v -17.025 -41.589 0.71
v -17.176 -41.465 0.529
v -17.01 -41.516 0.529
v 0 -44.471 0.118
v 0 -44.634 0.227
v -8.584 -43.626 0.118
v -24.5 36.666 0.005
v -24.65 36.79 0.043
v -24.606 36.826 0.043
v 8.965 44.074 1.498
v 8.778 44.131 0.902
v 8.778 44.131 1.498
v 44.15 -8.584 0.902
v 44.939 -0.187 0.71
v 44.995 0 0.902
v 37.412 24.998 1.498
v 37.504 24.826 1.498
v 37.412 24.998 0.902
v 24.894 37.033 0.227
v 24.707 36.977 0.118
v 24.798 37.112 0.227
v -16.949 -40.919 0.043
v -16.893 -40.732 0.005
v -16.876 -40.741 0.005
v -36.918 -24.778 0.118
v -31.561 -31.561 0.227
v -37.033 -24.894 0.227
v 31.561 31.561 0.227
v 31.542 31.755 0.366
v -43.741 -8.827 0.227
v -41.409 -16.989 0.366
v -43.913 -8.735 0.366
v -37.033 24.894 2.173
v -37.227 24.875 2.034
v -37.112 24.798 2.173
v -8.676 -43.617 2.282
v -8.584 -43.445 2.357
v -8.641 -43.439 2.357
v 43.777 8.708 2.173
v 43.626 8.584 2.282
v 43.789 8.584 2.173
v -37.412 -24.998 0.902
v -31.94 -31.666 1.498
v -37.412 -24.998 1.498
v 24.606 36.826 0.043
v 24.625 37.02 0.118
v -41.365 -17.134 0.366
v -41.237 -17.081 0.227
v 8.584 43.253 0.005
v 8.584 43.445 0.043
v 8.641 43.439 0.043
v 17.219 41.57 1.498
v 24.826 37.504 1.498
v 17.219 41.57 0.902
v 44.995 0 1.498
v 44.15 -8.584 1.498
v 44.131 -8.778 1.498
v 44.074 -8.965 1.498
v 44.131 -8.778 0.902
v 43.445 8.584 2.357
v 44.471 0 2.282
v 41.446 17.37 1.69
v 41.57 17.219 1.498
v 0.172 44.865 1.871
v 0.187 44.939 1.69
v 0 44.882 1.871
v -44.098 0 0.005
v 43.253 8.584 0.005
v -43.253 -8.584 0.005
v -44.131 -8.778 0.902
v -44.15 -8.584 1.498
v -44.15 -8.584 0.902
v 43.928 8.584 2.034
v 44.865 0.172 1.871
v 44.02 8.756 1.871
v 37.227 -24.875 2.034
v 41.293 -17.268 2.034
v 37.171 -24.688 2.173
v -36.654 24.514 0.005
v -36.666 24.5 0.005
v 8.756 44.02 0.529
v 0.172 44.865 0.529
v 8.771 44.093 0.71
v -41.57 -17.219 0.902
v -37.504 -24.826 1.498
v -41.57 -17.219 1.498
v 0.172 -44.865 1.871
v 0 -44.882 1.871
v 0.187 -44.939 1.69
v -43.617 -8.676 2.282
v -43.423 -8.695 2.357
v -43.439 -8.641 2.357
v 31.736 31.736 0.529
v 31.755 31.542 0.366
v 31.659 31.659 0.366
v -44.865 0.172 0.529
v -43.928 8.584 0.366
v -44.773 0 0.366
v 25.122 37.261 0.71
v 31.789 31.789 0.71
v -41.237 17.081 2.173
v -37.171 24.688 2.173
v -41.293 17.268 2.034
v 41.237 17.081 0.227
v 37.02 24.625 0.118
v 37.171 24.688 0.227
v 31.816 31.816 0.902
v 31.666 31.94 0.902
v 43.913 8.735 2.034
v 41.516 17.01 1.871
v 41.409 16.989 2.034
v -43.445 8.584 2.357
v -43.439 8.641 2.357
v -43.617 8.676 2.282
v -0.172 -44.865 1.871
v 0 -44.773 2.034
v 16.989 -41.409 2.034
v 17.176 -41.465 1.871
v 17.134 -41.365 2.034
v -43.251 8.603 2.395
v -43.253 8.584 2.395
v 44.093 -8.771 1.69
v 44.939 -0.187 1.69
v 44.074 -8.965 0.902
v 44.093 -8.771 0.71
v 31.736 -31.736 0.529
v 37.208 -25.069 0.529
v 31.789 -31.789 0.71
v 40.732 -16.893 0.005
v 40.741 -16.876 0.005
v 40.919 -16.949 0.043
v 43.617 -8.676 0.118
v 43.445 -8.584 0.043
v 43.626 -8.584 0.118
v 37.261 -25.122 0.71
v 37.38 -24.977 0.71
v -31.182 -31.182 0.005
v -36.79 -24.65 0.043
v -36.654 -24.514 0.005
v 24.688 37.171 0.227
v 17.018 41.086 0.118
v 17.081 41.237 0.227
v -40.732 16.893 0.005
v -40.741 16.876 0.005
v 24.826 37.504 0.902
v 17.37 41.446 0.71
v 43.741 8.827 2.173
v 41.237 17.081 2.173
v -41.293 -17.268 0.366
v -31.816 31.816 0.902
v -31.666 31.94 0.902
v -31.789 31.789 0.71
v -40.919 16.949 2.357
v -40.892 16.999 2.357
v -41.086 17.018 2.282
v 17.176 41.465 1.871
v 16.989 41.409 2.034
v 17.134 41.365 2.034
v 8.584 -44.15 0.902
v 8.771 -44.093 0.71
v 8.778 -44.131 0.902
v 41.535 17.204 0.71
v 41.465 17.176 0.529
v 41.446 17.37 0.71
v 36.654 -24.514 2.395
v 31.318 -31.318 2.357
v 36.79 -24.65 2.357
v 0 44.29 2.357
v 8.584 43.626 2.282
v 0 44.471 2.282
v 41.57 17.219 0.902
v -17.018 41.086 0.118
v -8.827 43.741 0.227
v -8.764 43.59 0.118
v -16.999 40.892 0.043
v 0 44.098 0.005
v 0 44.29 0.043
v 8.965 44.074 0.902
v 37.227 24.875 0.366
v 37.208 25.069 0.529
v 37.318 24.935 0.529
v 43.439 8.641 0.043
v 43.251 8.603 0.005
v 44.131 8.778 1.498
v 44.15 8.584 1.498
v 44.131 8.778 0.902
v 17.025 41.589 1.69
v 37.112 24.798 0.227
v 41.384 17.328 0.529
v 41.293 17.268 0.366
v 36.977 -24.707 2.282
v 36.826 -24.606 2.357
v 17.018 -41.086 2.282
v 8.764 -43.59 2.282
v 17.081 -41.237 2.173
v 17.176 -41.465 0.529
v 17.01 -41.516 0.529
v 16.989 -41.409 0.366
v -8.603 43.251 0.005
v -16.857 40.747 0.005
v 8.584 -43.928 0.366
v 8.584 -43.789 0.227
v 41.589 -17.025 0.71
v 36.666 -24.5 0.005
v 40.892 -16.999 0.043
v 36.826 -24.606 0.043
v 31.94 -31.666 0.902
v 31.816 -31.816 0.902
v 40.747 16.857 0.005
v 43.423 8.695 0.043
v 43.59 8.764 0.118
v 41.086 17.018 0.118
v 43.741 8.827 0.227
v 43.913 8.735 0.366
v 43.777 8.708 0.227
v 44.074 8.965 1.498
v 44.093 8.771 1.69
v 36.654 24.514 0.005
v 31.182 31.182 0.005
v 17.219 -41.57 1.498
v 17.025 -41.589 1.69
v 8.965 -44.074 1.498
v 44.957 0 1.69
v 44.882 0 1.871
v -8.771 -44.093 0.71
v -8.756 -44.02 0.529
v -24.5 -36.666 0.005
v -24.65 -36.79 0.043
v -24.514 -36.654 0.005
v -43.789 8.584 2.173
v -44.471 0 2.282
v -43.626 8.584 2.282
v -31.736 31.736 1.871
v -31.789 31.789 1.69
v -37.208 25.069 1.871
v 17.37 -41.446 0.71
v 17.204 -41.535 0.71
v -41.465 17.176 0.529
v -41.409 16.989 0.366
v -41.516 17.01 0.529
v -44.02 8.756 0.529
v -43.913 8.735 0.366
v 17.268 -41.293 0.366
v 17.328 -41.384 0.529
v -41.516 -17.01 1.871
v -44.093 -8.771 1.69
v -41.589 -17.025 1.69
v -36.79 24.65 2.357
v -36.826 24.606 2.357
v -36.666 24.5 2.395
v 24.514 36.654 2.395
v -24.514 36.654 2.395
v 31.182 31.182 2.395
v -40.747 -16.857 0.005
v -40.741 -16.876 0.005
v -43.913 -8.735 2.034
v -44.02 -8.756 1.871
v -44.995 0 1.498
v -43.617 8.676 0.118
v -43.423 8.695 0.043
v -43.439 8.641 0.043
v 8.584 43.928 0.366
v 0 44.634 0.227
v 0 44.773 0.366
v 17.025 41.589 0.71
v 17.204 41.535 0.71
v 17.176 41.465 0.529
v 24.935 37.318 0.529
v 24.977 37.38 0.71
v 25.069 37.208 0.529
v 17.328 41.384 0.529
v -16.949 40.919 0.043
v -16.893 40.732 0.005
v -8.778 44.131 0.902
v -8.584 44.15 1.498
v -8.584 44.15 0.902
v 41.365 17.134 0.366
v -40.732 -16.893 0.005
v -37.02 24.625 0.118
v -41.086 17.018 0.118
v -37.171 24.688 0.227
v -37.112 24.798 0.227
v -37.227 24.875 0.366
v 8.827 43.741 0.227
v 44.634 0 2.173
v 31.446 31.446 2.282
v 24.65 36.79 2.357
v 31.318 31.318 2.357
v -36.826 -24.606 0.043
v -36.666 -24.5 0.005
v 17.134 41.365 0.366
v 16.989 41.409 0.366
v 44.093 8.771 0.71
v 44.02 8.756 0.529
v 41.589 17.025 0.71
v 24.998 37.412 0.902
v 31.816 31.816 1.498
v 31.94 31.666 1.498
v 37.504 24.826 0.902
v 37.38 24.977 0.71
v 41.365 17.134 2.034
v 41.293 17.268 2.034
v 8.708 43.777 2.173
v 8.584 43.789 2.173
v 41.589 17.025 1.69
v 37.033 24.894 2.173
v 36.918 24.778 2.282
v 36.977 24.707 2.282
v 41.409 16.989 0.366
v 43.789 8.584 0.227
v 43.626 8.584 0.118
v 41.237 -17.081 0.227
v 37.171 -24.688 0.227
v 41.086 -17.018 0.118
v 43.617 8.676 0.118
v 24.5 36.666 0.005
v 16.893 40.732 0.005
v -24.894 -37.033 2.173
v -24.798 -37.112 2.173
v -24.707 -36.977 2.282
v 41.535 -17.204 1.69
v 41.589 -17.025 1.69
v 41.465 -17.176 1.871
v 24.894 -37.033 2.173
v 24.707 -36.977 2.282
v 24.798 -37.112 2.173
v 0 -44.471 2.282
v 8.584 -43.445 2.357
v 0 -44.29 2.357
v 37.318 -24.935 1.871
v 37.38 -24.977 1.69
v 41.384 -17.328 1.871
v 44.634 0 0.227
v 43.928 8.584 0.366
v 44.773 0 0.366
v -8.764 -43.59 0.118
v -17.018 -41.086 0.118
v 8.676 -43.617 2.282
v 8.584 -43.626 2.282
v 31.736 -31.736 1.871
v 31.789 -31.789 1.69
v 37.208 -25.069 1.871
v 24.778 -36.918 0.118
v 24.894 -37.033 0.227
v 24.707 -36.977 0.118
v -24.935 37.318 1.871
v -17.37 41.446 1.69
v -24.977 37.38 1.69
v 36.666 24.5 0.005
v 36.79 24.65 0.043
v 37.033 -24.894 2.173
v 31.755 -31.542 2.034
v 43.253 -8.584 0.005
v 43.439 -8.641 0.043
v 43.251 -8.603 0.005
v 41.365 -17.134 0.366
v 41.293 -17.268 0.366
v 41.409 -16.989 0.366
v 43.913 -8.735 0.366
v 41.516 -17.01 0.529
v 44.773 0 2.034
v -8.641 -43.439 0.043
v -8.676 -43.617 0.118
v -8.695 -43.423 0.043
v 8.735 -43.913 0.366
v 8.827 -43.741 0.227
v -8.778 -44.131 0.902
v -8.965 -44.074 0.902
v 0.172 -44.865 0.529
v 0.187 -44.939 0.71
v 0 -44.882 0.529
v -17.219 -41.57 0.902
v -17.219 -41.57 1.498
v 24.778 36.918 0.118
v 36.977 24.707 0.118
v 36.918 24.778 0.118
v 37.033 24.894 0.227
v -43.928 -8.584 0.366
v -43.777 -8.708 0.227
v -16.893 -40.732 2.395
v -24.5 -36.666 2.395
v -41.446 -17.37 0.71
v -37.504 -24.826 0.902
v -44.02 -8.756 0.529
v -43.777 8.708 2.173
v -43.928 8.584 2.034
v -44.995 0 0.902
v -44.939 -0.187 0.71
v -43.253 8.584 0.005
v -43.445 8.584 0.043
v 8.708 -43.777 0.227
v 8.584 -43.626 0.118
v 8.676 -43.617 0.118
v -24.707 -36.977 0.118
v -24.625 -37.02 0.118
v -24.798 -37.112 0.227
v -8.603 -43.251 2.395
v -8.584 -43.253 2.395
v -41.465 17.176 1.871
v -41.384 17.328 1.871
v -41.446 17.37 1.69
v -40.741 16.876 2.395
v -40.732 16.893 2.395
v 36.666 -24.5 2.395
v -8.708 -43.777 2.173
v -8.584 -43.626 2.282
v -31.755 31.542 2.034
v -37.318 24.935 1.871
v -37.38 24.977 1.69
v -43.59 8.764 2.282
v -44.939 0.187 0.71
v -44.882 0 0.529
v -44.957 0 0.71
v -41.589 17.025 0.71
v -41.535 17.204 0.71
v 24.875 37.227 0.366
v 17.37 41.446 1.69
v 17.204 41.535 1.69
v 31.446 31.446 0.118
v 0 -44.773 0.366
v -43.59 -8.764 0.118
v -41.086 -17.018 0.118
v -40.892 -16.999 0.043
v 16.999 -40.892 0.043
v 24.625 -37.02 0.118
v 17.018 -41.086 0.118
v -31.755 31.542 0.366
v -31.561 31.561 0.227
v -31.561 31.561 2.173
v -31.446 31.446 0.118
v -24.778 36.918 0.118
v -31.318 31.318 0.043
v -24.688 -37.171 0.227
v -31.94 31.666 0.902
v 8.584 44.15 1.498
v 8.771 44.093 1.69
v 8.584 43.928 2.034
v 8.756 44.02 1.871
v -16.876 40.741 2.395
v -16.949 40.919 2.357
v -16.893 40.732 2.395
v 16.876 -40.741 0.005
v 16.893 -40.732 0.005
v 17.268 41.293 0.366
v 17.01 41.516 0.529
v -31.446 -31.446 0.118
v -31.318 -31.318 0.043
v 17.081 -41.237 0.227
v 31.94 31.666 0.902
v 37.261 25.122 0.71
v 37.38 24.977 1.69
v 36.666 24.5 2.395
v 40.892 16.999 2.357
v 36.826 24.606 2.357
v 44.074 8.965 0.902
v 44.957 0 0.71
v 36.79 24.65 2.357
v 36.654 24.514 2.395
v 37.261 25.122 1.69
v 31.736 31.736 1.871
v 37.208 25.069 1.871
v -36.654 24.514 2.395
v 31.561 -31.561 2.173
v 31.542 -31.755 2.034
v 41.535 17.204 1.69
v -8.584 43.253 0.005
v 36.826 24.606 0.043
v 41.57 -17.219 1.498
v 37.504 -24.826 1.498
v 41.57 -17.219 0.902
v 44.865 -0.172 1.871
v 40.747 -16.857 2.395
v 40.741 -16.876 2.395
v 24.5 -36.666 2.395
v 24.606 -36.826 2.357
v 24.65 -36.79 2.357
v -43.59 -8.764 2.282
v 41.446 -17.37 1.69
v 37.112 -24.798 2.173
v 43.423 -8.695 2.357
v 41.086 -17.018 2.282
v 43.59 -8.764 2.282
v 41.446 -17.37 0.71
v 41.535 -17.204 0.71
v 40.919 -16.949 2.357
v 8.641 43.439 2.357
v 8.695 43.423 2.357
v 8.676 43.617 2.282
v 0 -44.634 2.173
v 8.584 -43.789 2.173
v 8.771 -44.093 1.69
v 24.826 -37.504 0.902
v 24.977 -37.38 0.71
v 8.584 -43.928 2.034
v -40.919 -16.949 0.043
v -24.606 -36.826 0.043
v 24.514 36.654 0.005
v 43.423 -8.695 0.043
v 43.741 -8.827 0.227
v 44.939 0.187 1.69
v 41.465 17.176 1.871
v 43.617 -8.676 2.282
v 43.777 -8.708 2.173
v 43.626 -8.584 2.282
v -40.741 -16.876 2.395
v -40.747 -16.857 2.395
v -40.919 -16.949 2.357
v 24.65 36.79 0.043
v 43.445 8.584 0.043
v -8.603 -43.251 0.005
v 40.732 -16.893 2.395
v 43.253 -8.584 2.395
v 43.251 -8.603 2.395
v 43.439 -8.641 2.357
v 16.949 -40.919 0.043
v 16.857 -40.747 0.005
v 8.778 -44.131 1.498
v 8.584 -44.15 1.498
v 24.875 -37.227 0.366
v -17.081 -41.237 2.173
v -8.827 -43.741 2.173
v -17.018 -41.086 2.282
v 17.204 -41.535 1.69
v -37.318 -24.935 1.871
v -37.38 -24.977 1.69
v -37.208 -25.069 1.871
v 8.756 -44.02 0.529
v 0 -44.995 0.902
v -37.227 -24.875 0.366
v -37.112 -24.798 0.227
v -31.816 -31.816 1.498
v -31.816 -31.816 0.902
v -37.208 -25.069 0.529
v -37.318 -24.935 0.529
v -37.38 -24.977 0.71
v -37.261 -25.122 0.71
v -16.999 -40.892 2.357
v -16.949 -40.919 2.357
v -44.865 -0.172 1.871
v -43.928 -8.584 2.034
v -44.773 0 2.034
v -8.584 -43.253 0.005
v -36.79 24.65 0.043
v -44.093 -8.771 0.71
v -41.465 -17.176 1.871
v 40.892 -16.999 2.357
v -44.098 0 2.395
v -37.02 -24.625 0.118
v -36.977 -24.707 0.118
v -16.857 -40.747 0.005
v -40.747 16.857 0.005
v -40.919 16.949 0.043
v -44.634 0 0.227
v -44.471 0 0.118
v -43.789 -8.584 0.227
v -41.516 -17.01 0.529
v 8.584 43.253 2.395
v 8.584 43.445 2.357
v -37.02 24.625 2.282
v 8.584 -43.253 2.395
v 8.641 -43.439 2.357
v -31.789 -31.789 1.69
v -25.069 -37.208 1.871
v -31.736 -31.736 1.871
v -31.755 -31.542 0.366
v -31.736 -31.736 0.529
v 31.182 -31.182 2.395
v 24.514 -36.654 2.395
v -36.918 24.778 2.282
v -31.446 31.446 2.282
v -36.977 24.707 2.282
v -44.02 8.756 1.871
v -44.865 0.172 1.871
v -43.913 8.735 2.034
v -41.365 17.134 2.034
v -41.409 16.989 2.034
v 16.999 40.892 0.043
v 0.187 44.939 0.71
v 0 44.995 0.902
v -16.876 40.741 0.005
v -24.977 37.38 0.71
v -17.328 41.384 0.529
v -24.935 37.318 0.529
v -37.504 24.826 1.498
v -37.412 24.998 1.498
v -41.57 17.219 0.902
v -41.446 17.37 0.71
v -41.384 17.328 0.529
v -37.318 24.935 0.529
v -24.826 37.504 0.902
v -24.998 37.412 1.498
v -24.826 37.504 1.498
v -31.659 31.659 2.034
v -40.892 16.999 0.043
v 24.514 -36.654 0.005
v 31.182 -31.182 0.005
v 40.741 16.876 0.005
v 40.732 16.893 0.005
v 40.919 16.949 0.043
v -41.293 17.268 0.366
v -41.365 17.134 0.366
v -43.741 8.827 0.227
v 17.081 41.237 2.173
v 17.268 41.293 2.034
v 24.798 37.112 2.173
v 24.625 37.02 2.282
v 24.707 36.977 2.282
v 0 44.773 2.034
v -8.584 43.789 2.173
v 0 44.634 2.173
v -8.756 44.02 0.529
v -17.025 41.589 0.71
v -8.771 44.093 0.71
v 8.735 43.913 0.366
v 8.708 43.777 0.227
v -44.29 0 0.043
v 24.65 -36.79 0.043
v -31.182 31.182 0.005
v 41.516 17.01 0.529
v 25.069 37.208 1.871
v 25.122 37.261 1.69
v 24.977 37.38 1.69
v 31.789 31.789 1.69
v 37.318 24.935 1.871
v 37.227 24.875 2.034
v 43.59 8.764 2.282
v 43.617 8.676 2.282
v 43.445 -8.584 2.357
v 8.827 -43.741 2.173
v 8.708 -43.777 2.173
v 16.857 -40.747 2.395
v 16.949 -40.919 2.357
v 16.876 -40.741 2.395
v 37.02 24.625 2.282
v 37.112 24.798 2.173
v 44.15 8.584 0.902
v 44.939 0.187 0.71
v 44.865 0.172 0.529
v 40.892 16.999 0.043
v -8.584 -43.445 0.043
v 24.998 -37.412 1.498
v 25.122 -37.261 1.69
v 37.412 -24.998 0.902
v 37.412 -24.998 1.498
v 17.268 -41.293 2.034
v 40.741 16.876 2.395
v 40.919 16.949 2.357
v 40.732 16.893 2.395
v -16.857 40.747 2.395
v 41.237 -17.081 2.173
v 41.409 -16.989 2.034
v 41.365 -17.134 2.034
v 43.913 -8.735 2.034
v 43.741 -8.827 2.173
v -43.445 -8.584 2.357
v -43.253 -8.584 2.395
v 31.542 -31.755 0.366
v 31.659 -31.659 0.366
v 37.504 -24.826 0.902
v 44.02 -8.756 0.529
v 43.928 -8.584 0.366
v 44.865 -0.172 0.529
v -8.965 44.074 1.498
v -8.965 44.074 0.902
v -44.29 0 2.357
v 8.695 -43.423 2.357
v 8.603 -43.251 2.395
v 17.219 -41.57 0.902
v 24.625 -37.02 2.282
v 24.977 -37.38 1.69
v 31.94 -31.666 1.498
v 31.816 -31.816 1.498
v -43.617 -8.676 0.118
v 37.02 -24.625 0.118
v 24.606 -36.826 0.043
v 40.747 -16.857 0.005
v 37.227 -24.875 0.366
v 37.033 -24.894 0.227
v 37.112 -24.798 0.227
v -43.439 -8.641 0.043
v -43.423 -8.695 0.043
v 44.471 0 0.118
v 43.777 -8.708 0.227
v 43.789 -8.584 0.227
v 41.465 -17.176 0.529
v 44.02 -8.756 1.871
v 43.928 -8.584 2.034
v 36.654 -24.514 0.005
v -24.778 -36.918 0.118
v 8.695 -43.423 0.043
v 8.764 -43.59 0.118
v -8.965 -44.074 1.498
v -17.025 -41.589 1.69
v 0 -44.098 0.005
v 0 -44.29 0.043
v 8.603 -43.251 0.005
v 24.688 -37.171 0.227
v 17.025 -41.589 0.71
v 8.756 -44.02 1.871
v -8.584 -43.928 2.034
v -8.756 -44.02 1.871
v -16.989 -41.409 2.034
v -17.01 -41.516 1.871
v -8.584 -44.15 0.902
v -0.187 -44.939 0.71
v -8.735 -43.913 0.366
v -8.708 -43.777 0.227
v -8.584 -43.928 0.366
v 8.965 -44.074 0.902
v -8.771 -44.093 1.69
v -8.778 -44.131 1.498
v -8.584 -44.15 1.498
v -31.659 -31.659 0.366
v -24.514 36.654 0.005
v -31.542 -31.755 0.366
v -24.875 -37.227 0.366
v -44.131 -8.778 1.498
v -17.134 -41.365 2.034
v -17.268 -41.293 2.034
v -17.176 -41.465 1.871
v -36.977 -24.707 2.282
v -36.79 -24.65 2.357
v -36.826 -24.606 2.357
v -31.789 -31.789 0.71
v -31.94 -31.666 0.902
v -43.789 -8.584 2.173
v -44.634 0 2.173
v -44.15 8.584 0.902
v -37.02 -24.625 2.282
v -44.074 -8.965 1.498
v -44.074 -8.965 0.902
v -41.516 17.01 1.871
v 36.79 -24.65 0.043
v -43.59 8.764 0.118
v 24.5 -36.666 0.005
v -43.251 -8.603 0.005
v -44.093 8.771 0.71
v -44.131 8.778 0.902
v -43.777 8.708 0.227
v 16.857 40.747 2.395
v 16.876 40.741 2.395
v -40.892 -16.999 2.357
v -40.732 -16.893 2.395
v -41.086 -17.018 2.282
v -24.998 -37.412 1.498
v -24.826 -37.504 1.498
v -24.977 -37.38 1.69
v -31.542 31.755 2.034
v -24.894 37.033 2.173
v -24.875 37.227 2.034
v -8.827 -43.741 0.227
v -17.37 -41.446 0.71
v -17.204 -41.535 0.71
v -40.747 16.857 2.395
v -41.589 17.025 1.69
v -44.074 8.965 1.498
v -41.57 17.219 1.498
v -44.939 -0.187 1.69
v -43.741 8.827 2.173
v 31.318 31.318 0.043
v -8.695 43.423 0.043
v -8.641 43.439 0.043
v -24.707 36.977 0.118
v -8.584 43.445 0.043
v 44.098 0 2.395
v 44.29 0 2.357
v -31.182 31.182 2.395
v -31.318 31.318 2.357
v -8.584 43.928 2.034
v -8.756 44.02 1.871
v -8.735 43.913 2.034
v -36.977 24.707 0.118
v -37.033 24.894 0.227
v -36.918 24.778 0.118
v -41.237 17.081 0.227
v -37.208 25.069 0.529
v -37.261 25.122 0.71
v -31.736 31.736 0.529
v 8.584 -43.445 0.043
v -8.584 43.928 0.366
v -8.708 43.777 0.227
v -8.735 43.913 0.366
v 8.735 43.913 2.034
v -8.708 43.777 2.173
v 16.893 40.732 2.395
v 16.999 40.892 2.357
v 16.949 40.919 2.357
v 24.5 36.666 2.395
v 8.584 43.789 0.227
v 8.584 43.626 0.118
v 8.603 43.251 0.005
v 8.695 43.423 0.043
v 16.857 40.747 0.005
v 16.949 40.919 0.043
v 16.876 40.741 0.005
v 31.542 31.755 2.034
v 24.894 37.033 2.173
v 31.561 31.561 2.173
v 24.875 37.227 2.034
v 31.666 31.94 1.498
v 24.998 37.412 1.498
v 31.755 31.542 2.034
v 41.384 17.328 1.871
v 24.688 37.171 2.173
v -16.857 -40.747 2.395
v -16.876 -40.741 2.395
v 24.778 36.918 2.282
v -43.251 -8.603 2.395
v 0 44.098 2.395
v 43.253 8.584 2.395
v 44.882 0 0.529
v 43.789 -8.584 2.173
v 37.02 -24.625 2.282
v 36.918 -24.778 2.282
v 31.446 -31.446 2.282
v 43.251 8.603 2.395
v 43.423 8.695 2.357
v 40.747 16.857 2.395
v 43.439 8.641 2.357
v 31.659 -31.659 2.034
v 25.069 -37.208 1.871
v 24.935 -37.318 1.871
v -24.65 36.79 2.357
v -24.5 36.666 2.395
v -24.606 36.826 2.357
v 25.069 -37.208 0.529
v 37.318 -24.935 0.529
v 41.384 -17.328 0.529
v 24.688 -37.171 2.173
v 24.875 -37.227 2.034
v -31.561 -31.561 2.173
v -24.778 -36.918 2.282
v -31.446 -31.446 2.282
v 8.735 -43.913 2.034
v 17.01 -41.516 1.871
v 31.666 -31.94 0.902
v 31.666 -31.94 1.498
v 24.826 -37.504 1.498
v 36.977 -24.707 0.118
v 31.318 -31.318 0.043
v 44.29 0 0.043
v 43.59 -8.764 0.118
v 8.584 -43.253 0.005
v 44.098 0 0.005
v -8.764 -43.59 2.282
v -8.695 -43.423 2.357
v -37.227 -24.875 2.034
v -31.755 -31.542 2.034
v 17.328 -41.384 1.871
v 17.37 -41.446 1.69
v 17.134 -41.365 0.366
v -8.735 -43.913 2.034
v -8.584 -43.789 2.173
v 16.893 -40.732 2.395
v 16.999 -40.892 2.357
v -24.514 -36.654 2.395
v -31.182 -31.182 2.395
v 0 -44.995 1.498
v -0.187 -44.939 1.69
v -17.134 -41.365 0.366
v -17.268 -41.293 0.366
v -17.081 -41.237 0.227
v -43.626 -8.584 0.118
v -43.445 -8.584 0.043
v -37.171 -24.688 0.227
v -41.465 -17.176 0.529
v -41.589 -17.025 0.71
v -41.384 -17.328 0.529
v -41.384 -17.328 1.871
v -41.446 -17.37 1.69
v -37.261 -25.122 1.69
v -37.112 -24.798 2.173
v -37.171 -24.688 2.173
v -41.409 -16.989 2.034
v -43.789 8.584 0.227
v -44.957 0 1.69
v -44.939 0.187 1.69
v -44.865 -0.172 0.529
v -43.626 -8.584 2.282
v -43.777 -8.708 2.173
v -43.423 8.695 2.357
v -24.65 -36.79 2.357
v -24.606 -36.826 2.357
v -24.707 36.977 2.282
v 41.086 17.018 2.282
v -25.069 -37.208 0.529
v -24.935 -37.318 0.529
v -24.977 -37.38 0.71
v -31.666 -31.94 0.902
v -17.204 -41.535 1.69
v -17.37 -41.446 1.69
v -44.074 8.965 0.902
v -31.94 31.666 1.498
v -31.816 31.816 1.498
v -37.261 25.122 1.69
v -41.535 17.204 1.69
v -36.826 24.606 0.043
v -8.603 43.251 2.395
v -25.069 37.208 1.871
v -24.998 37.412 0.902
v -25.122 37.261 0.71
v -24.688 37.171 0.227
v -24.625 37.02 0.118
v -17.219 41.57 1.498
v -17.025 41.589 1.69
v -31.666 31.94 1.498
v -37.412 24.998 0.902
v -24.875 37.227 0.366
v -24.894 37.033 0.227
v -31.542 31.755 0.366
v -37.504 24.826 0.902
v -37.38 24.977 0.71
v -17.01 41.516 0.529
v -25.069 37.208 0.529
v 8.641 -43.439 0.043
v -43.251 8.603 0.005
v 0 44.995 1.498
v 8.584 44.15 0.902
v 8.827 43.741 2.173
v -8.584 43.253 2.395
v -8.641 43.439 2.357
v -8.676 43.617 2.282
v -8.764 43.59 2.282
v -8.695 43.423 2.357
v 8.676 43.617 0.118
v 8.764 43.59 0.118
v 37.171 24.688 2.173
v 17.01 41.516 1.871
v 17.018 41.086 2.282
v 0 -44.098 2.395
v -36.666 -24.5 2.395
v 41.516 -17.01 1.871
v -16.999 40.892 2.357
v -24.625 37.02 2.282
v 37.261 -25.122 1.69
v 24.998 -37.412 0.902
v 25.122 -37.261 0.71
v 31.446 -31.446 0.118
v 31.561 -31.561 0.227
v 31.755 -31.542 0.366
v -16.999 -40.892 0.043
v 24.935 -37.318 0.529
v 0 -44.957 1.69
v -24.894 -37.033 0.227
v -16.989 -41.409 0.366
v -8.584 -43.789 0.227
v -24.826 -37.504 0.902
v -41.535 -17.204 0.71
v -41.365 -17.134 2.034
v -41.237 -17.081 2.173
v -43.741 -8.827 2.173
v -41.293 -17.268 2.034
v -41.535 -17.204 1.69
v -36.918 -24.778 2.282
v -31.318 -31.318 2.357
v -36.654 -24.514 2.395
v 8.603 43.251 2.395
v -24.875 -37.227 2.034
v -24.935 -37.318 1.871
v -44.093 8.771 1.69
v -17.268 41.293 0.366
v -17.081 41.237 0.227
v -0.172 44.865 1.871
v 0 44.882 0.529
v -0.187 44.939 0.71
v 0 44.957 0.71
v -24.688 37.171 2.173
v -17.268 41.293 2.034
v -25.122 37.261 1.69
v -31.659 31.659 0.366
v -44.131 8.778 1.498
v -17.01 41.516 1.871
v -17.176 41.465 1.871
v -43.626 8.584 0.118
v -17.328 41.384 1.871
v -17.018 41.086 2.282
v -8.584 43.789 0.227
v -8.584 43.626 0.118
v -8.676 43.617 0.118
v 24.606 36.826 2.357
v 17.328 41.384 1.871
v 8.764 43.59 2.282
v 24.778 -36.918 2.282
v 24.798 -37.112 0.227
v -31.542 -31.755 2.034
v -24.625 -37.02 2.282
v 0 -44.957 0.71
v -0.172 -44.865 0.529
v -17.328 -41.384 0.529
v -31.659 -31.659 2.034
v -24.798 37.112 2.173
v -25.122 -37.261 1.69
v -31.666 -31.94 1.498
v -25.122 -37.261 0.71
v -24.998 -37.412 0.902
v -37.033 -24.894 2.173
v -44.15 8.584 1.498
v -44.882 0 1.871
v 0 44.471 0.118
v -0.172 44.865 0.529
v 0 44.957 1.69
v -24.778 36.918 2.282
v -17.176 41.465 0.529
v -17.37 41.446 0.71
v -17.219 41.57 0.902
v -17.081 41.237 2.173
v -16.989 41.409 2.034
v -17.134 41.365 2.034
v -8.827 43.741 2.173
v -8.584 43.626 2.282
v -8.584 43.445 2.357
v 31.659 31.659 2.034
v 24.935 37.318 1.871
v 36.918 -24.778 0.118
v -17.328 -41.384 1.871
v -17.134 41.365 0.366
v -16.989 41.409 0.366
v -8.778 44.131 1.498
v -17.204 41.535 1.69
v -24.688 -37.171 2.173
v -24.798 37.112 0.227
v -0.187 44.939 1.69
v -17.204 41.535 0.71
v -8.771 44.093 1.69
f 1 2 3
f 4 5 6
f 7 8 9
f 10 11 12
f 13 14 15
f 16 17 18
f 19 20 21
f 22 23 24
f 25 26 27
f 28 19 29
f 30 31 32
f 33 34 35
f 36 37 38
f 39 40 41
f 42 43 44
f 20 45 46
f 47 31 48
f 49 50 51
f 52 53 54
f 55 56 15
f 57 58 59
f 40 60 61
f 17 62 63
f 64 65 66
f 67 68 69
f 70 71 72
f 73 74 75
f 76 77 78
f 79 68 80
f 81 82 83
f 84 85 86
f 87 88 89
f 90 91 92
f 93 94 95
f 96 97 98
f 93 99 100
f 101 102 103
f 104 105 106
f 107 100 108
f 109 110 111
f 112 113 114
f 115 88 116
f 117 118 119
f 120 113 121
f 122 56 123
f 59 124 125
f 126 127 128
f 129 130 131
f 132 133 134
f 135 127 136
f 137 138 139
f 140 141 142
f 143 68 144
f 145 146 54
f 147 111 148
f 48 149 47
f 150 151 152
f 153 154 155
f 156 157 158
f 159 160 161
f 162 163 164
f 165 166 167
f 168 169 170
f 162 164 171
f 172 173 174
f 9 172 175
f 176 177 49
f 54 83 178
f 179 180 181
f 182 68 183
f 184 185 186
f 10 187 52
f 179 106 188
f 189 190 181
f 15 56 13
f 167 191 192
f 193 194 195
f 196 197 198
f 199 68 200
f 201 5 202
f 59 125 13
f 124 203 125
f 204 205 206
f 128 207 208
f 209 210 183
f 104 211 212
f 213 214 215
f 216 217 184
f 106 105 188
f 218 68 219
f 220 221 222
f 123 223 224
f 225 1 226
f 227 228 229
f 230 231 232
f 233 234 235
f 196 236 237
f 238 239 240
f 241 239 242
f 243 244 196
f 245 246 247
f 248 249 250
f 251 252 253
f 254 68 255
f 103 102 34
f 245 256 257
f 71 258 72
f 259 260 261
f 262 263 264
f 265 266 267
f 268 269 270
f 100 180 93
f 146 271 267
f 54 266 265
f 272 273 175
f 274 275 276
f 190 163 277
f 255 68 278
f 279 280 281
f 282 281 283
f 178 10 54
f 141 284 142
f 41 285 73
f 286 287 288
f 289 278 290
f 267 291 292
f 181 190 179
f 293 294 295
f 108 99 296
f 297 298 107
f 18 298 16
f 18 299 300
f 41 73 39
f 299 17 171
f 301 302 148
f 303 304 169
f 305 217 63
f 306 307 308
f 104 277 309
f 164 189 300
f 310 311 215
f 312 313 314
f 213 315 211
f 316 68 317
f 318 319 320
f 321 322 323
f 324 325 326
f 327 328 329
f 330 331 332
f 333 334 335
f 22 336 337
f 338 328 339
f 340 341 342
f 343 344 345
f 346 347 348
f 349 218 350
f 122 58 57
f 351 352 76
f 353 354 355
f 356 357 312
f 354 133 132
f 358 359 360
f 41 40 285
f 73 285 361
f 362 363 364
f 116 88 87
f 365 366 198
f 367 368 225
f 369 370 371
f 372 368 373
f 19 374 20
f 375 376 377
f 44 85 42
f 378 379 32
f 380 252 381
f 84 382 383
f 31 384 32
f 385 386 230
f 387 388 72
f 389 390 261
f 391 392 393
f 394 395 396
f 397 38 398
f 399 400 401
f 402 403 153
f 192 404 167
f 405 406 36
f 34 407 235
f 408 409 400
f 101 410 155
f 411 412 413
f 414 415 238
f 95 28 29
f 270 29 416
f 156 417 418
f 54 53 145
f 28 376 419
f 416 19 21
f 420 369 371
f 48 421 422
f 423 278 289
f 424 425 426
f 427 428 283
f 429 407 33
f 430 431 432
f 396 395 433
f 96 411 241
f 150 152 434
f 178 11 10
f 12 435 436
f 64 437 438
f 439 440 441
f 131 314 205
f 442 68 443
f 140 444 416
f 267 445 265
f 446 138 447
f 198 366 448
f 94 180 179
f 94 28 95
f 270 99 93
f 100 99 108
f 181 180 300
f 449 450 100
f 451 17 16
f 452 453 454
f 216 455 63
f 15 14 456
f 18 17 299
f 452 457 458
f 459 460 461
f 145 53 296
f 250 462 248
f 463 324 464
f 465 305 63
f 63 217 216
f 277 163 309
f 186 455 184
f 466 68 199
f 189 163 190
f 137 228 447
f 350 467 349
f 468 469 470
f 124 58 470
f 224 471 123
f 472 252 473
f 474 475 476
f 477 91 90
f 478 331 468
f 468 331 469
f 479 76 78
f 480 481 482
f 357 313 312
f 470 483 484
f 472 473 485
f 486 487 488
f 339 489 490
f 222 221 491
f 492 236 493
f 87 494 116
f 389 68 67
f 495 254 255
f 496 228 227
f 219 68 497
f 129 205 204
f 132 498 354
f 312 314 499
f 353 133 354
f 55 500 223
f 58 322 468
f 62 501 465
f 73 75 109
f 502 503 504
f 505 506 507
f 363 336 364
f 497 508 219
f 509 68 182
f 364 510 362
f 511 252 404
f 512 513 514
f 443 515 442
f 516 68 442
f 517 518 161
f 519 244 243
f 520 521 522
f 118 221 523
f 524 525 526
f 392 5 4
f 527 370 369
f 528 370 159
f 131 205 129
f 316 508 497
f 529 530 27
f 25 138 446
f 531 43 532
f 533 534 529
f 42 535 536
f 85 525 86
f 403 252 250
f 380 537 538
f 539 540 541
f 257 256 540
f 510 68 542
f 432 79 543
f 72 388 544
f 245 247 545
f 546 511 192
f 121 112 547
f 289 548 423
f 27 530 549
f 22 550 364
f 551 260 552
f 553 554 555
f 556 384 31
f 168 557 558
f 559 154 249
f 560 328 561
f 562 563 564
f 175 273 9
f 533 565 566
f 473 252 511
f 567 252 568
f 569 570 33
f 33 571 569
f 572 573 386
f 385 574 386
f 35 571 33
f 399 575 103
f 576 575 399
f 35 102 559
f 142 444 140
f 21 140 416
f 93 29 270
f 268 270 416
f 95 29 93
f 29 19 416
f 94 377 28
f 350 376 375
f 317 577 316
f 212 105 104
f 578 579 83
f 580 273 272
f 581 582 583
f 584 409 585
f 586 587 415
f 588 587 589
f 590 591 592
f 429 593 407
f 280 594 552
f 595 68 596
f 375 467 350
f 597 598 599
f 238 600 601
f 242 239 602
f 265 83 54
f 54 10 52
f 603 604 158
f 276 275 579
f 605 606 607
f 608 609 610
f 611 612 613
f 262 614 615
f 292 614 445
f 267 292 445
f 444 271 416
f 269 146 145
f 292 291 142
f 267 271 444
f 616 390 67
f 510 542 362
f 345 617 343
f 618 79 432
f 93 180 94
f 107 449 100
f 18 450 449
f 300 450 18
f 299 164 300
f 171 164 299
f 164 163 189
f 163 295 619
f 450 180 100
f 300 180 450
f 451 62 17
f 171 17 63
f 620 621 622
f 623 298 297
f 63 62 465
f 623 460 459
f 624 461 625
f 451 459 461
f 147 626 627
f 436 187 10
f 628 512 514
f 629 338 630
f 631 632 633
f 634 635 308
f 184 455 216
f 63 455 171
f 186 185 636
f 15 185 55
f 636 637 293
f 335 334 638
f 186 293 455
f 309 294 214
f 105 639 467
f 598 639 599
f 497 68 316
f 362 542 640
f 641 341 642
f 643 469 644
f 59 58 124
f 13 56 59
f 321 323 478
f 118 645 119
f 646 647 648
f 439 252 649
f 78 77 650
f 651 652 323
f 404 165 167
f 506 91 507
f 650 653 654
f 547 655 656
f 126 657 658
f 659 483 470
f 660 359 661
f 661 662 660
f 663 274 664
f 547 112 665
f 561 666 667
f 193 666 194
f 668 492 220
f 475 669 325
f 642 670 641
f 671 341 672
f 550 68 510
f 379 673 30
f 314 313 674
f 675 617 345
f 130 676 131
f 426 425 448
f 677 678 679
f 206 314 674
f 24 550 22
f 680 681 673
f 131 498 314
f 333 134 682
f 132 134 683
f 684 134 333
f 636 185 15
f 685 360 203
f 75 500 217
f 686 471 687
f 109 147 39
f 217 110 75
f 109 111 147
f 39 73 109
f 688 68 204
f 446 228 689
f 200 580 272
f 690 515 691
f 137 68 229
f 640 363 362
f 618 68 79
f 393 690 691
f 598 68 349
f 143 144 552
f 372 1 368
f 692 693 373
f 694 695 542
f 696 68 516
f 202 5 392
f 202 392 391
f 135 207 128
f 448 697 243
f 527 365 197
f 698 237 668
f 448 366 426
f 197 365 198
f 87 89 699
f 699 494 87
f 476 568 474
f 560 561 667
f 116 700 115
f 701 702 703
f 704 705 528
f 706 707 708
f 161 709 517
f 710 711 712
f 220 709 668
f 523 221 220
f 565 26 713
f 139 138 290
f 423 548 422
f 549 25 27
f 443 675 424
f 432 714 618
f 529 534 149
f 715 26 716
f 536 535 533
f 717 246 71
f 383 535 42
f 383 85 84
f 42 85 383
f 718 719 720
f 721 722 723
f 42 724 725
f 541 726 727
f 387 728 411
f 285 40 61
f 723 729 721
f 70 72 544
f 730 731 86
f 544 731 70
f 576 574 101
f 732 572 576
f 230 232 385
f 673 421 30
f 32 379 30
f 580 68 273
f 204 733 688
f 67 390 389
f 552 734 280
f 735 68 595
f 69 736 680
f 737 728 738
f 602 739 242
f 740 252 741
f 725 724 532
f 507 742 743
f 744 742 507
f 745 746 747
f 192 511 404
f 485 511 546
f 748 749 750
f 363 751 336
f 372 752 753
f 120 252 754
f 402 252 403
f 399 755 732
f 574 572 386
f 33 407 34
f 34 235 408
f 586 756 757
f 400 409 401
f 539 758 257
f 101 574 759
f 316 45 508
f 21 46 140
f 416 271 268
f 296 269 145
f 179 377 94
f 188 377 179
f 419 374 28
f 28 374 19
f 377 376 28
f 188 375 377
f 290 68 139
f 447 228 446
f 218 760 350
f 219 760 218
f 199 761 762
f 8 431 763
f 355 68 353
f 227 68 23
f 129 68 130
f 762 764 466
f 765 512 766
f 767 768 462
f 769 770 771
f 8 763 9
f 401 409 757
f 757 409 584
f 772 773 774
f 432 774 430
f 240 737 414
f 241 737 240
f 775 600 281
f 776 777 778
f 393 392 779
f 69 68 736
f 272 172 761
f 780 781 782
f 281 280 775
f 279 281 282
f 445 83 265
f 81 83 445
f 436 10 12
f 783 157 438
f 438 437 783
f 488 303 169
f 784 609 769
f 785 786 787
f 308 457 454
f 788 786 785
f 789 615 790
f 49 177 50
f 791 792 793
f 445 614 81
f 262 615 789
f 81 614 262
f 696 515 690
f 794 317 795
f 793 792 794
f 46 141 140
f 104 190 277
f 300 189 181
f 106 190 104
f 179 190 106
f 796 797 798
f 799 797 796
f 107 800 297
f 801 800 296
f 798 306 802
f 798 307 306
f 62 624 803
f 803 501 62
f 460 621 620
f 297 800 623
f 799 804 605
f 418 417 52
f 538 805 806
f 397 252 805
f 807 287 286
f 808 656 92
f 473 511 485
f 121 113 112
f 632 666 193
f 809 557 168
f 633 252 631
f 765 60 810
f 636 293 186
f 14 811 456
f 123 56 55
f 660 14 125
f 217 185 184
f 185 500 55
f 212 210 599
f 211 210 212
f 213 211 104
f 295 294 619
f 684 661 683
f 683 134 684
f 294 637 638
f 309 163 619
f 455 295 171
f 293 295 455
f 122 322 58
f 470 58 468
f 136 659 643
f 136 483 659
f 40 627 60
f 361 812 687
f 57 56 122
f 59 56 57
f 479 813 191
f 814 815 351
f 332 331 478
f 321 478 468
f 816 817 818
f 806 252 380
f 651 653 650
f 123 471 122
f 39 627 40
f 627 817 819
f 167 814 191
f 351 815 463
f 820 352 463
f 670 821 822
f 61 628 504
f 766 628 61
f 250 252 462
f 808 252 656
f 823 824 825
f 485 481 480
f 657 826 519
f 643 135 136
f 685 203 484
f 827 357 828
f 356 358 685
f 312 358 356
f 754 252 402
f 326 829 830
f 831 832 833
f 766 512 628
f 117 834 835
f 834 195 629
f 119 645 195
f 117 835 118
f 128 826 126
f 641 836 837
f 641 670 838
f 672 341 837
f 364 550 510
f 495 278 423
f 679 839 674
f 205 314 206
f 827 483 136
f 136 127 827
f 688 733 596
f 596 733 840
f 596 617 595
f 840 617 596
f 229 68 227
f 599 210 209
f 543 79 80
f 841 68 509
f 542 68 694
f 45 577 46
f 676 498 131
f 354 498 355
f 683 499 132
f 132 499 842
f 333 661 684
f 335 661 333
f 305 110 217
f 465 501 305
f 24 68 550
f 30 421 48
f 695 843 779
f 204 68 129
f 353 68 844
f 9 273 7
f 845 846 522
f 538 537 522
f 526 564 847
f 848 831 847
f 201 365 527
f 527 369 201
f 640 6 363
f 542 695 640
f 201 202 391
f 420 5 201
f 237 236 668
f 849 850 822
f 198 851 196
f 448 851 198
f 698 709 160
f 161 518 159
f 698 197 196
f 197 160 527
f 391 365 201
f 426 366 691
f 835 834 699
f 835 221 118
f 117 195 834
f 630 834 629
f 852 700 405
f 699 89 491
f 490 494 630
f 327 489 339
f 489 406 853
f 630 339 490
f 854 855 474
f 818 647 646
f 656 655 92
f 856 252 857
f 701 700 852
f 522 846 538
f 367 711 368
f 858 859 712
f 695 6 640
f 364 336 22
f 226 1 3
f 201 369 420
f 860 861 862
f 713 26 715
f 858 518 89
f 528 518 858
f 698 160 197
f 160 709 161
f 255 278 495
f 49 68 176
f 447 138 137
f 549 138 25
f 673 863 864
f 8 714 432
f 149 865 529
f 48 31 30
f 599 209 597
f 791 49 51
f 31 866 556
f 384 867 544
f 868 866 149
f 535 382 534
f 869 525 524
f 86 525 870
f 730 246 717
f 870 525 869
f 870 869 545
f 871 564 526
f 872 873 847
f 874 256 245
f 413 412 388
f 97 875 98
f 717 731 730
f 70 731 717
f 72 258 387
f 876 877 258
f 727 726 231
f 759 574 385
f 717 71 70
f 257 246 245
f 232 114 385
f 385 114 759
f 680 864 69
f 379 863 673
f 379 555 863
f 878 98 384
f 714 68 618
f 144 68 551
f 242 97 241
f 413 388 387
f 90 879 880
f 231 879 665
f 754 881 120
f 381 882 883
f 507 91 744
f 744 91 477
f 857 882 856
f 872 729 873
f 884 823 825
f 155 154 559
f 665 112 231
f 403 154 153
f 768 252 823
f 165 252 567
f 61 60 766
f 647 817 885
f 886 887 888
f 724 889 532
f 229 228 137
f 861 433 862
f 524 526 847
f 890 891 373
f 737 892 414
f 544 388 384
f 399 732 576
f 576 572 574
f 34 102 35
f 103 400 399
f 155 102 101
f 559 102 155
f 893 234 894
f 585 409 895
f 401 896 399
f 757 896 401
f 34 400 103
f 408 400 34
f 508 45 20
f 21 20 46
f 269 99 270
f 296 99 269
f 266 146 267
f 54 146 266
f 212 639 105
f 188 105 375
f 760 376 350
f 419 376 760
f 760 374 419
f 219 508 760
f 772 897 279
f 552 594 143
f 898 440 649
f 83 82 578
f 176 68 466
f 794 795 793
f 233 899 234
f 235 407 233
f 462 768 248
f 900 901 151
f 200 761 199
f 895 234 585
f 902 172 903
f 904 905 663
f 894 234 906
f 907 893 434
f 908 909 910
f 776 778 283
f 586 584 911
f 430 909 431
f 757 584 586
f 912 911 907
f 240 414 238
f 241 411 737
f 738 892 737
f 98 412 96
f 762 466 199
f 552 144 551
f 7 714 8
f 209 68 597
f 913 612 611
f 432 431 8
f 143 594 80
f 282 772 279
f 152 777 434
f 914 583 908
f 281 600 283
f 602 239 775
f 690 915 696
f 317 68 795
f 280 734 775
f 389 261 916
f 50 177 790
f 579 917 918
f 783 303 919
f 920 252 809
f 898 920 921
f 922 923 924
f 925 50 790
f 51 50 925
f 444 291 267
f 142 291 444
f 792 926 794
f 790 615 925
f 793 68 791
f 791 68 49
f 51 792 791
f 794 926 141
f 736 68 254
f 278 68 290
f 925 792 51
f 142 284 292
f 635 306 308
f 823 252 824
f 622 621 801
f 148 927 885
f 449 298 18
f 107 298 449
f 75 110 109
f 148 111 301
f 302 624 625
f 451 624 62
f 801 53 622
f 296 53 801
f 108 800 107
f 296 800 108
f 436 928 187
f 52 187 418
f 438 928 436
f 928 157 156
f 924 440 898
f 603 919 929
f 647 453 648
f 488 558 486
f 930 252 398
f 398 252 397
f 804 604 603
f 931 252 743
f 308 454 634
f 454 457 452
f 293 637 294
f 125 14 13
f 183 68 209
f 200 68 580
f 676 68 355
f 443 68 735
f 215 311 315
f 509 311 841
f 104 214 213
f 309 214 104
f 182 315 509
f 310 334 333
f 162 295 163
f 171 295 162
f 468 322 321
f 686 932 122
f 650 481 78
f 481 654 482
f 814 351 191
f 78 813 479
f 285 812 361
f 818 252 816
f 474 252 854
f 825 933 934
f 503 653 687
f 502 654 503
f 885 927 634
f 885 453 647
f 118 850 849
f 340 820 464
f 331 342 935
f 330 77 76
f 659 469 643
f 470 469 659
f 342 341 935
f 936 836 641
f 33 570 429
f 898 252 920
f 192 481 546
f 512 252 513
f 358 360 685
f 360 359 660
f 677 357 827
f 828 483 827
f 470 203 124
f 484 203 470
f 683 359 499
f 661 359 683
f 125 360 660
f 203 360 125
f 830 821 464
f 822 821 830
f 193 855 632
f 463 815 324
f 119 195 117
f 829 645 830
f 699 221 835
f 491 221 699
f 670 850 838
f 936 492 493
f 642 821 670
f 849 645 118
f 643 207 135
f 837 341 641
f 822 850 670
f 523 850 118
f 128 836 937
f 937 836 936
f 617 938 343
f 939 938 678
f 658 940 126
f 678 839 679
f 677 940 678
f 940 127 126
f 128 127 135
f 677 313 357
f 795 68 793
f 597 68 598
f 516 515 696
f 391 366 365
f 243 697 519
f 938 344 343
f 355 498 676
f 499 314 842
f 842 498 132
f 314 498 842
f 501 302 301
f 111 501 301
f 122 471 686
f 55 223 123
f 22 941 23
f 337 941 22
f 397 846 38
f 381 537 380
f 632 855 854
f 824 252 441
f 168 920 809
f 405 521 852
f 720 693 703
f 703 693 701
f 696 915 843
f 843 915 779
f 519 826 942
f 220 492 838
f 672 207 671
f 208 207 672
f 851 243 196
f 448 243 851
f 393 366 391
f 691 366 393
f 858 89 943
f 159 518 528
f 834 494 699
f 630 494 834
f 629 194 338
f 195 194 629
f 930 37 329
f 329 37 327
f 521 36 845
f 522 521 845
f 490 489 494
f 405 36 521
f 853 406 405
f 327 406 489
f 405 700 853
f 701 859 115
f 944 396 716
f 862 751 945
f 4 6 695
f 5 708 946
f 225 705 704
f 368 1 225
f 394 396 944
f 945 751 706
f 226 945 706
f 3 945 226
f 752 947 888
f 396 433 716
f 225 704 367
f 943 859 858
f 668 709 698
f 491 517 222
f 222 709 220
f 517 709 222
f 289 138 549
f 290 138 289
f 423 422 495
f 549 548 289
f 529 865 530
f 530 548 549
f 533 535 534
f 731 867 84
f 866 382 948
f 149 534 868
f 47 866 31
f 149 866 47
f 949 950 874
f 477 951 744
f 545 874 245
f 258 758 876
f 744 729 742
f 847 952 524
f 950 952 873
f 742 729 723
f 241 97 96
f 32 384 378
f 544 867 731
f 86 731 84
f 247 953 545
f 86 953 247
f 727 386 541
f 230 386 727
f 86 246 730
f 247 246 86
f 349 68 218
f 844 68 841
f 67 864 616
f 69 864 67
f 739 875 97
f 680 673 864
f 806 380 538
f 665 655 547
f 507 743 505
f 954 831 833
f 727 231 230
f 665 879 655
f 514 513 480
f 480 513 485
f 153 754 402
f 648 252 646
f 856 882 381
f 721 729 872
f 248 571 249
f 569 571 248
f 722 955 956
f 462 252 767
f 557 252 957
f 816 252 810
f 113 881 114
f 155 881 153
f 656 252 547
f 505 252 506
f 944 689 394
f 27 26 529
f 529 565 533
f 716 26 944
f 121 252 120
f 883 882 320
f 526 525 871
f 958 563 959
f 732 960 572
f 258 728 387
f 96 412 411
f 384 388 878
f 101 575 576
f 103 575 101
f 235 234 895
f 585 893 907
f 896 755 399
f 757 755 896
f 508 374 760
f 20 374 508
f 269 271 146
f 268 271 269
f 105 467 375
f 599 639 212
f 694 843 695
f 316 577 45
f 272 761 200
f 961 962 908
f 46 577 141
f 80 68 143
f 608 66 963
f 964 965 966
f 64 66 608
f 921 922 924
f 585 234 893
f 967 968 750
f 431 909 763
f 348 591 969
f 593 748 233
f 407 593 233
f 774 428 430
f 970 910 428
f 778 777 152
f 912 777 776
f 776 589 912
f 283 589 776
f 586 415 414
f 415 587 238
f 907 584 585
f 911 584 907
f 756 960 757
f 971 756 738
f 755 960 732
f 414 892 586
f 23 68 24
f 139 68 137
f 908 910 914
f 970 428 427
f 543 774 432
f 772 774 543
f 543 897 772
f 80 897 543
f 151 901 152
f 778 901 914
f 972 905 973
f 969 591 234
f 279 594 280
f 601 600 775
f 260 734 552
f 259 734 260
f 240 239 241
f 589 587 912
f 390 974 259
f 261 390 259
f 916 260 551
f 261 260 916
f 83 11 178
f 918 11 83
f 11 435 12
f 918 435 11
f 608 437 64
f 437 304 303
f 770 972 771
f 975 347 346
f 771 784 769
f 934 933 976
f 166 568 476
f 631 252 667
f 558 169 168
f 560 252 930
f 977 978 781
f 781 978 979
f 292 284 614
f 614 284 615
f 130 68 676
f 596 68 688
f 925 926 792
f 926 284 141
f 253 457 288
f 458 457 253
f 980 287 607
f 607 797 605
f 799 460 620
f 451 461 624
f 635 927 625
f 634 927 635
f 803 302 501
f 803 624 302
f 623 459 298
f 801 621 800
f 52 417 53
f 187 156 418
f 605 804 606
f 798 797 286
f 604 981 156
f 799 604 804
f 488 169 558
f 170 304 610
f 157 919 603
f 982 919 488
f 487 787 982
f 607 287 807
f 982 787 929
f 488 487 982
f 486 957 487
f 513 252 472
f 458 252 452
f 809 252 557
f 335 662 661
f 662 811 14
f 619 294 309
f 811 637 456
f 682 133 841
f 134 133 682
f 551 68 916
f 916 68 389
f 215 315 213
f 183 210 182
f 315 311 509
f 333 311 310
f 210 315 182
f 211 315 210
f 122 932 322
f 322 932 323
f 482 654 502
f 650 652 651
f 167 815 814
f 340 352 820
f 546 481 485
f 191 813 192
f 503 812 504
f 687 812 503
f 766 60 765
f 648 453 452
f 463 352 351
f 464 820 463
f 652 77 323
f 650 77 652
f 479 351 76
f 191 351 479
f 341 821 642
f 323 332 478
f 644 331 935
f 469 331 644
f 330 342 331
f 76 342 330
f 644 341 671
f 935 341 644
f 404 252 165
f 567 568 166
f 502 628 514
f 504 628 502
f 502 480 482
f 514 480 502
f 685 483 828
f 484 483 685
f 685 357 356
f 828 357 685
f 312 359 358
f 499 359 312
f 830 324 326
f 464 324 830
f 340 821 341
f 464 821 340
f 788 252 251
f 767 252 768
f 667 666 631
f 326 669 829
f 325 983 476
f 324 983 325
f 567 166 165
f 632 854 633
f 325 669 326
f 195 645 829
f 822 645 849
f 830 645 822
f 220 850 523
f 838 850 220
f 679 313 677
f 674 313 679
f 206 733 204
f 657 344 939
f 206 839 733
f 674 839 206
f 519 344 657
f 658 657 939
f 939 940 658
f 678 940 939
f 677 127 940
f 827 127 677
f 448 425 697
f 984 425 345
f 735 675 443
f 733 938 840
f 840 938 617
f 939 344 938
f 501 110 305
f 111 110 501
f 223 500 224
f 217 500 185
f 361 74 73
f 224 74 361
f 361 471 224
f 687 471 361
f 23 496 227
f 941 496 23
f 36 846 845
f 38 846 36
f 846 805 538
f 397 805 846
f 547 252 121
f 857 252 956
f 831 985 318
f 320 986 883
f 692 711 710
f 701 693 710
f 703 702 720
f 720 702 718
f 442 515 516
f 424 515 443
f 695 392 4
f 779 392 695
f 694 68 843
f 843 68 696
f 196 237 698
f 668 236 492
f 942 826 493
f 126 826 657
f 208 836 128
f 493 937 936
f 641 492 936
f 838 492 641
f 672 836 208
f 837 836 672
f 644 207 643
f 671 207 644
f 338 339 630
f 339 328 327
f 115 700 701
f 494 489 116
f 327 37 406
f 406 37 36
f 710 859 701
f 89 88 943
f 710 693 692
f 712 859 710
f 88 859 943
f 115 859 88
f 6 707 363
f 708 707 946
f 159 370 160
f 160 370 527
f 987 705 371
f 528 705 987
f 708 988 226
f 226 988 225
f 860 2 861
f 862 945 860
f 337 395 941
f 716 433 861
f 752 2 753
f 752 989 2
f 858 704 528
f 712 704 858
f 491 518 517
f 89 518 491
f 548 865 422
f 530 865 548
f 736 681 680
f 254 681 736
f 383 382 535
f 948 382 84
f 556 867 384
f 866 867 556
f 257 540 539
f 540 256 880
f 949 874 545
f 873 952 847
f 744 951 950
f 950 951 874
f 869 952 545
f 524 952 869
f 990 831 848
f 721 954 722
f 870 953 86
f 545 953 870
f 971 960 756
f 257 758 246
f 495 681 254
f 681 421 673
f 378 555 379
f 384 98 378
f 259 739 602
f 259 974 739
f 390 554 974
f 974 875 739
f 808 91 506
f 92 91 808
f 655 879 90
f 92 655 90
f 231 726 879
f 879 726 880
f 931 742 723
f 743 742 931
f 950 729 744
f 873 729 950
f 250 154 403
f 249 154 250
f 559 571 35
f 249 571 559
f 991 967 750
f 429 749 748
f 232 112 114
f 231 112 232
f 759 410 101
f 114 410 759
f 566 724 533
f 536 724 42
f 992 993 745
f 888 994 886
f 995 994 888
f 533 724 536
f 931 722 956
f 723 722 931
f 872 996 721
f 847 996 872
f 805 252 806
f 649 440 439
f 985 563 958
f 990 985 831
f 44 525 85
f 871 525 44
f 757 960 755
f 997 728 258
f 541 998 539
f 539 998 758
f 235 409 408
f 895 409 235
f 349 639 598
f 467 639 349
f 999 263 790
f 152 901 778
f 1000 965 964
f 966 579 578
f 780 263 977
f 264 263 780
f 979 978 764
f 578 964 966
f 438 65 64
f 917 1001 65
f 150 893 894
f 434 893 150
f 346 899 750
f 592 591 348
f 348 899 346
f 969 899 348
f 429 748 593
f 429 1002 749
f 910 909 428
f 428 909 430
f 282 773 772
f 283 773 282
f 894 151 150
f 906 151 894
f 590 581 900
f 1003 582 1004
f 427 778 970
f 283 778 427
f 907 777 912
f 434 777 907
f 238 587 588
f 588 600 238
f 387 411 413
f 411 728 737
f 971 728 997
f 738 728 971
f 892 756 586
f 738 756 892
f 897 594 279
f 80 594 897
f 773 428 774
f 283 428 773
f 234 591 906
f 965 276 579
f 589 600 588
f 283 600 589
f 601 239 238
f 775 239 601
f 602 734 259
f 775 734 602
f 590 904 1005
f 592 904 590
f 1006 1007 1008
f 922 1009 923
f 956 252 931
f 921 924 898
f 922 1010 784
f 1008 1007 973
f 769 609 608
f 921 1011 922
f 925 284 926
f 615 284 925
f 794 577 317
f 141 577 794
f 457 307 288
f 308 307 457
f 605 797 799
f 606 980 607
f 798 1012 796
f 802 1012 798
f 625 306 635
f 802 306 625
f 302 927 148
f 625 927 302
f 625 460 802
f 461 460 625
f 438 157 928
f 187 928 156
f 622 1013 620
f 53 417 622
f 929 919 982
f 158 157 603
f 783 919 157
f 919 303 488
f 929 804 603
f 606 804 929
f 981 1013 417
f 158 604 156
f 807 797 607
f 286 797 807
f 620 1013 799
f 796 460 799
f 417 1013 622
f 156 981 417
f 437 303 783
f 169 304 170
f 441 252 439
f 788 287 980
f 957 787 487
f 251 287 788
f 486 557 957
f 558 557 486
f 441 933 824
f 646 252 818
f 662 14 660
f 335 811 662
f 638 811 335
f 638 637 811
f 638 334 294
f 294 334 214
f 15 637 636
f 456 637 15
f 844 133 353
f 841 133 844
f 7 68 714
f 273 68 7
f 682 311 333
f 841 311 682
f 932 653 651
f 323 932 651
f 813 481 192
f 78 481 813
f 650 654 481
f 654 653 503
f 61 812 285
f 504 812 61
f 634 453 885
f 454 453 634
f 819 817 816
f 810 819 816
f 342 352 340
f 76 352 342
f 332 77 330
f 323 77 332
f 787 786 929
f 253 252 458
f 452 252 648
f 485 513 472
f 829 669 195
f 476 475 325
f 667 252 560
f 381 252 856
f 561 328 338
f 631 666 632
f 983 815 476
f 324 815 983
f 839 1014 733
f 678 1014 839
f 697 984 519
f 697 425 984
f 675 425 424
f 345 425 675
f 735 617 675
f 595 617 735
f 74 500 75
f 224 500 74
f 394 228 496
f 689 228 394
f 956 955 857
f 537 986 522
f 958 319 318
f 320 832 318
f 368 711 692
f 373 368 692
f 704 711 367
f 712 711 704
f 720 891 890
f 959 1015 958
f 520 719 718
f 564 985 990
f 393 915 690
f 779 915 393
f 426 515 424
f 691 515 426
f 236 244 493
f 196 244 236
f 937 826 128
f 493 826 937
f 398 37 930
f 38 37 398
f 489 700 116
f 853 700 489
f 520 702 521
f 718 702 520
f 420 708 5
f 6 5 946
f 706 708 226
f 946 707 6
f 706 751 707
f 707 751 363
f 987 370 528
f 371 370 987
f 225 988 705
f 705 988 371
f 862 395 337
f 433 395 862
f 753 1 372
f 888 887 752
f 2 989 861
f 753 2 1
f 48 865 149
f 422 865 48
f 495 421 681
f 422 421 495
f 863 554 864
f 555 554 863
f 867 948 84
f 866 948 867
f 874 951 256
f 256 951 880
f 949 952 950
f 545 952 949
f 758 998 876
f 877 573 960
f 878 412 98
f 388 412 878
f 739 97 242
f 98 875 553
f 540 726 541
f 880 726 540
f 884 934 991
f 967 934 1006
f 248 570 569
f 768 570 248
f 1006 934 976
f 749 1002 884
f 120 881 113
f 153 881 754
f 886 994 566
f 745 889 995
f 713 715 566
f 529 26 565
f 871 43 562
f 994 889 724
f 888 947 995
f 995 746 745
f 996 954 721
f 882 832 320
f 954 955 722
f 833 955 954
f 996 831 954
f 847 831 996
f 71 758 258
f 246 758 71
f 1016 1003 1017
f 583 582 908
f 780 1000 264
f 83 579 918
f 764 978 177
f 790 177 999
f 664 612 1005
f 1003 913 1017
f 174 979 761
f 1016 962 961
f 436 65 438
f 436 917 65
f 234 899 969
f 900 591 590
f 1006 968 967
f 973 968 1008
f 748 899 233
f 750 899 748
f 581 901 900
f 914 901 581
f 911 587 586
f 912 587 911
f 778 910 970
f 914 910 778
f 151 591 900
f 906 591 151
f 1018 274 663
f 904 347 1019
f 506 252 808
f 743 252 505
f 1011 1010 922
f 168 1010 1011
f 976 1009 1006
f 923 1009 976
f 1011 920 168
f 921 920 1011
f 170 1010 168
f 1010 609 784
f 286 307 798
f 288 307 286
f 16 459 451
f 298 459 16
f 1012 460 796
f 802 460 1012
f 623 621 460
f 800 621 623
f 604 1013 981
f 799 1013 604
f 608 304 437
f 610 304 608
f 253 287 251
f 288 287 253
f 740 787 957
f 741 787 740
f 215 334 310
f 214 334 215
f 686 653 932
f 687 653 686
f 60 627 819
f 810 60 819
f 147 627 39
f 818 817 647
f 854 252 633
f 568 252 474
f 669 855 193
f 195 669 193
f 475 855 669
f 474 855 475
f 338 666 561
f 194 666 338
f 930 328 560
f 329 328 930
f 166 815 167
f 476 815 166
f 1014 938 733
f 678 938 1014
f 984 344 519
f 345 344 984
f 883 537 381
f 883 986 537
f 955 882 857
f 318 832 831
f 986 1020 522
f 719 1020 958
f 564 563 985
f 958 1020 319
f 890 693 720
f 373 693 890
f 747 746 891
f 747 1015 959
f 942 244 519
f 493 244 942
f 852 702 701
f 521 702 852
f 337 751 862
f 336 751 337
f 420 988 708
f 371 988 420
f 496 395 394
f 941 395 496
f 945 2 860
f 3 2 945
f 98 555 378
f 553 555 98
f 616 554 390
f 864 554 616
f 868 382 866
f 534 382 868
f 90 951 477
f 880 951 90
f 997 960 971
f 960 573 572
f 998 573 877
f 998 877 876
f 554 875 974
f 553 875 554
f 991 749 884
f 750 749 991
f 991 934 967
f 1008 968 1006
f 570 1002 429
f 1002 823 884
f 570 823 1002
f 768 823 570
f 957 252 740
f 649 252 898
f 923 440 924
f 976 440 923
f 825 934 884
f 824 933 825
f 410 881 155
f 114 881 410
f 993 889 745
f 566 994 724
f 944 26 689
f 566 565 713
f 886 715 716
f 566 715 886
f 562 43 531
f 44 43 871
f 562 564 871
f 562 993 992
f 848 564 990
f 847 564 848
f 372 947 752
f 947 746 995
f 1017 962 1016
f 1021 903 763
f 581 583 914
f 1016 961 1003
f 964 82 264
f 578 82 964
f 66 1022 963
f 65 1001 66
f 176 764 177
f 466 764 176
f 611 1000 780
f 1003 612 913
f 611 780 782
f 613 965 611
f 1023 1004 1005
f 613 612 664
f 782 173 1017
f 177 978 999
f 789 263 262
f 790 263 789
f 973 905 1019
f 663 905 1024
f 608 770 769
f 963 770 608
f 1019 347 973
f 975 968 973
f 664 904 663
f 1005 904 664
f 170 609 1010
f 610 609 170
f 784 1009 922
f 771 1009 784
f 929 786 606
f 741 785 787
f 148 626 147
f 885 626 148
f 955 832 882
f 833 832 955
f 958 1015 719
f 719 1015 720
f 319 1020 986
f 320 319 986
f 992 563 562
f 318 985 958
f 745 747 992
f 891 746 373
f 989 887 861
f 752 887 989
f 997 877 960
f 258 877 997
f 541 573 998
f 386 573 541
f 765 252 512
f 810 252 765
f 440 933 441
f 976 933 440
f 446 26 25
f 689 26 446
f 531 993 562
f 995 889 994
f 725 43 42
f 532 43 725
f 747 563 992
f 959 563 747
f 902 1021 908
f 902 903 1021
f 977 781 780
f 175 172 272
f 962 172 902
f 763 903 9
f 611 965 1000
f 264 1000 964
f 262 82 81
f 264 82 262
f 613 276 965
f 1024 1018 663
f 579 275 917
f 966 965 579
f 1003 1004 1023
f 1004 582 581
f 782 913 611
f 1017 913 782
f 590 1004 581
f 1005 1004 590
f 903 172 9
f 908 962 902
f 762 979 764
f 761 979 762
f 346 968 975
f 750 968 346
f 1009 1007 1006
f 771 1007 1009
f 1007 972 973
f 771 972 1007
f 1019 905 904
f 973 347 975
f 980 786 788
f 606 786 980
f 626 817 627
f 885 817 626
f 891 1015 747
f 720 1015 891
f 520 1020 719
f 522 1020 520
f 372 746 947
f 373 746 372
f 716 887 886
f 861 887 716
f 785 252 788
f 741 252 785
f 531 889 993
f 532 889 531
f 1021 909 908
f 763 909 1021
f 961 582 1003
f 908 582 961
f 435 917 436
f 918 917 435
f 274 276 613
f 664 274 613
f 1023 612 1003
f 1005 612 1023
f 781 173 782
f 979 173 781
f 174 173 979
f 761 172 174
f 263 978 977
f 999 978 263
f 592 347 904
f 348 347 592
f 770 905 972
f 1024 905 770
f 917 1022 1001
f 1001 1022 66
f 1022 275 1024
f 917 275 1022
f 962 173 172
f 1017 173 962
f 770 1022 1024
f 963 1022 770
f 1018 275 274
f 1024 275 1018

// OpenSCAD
// Untersetzer

/* [Dimensions] */

// Outer diameter of base plate
d2 = 90; // [40:200]

// Height of base plate
h = 2.4; // [0.5:0.1:20]

// Edge rounding radius (capped at h/2)
r = 1.0; // [0.1:0.1:5]

/* [Quality] */

// Render resolution (keep low for preview, increase for final export)
$fn = 32; // [8:8:180]


rr = min(r, h/2);

// Base plate — all edges rounded, bounding box preserved
translate([0,0,rr])
minkowski() {
  cylinder(h=h-rr*2, d=d2-rr*2);
  sphere(r=rr);
}
